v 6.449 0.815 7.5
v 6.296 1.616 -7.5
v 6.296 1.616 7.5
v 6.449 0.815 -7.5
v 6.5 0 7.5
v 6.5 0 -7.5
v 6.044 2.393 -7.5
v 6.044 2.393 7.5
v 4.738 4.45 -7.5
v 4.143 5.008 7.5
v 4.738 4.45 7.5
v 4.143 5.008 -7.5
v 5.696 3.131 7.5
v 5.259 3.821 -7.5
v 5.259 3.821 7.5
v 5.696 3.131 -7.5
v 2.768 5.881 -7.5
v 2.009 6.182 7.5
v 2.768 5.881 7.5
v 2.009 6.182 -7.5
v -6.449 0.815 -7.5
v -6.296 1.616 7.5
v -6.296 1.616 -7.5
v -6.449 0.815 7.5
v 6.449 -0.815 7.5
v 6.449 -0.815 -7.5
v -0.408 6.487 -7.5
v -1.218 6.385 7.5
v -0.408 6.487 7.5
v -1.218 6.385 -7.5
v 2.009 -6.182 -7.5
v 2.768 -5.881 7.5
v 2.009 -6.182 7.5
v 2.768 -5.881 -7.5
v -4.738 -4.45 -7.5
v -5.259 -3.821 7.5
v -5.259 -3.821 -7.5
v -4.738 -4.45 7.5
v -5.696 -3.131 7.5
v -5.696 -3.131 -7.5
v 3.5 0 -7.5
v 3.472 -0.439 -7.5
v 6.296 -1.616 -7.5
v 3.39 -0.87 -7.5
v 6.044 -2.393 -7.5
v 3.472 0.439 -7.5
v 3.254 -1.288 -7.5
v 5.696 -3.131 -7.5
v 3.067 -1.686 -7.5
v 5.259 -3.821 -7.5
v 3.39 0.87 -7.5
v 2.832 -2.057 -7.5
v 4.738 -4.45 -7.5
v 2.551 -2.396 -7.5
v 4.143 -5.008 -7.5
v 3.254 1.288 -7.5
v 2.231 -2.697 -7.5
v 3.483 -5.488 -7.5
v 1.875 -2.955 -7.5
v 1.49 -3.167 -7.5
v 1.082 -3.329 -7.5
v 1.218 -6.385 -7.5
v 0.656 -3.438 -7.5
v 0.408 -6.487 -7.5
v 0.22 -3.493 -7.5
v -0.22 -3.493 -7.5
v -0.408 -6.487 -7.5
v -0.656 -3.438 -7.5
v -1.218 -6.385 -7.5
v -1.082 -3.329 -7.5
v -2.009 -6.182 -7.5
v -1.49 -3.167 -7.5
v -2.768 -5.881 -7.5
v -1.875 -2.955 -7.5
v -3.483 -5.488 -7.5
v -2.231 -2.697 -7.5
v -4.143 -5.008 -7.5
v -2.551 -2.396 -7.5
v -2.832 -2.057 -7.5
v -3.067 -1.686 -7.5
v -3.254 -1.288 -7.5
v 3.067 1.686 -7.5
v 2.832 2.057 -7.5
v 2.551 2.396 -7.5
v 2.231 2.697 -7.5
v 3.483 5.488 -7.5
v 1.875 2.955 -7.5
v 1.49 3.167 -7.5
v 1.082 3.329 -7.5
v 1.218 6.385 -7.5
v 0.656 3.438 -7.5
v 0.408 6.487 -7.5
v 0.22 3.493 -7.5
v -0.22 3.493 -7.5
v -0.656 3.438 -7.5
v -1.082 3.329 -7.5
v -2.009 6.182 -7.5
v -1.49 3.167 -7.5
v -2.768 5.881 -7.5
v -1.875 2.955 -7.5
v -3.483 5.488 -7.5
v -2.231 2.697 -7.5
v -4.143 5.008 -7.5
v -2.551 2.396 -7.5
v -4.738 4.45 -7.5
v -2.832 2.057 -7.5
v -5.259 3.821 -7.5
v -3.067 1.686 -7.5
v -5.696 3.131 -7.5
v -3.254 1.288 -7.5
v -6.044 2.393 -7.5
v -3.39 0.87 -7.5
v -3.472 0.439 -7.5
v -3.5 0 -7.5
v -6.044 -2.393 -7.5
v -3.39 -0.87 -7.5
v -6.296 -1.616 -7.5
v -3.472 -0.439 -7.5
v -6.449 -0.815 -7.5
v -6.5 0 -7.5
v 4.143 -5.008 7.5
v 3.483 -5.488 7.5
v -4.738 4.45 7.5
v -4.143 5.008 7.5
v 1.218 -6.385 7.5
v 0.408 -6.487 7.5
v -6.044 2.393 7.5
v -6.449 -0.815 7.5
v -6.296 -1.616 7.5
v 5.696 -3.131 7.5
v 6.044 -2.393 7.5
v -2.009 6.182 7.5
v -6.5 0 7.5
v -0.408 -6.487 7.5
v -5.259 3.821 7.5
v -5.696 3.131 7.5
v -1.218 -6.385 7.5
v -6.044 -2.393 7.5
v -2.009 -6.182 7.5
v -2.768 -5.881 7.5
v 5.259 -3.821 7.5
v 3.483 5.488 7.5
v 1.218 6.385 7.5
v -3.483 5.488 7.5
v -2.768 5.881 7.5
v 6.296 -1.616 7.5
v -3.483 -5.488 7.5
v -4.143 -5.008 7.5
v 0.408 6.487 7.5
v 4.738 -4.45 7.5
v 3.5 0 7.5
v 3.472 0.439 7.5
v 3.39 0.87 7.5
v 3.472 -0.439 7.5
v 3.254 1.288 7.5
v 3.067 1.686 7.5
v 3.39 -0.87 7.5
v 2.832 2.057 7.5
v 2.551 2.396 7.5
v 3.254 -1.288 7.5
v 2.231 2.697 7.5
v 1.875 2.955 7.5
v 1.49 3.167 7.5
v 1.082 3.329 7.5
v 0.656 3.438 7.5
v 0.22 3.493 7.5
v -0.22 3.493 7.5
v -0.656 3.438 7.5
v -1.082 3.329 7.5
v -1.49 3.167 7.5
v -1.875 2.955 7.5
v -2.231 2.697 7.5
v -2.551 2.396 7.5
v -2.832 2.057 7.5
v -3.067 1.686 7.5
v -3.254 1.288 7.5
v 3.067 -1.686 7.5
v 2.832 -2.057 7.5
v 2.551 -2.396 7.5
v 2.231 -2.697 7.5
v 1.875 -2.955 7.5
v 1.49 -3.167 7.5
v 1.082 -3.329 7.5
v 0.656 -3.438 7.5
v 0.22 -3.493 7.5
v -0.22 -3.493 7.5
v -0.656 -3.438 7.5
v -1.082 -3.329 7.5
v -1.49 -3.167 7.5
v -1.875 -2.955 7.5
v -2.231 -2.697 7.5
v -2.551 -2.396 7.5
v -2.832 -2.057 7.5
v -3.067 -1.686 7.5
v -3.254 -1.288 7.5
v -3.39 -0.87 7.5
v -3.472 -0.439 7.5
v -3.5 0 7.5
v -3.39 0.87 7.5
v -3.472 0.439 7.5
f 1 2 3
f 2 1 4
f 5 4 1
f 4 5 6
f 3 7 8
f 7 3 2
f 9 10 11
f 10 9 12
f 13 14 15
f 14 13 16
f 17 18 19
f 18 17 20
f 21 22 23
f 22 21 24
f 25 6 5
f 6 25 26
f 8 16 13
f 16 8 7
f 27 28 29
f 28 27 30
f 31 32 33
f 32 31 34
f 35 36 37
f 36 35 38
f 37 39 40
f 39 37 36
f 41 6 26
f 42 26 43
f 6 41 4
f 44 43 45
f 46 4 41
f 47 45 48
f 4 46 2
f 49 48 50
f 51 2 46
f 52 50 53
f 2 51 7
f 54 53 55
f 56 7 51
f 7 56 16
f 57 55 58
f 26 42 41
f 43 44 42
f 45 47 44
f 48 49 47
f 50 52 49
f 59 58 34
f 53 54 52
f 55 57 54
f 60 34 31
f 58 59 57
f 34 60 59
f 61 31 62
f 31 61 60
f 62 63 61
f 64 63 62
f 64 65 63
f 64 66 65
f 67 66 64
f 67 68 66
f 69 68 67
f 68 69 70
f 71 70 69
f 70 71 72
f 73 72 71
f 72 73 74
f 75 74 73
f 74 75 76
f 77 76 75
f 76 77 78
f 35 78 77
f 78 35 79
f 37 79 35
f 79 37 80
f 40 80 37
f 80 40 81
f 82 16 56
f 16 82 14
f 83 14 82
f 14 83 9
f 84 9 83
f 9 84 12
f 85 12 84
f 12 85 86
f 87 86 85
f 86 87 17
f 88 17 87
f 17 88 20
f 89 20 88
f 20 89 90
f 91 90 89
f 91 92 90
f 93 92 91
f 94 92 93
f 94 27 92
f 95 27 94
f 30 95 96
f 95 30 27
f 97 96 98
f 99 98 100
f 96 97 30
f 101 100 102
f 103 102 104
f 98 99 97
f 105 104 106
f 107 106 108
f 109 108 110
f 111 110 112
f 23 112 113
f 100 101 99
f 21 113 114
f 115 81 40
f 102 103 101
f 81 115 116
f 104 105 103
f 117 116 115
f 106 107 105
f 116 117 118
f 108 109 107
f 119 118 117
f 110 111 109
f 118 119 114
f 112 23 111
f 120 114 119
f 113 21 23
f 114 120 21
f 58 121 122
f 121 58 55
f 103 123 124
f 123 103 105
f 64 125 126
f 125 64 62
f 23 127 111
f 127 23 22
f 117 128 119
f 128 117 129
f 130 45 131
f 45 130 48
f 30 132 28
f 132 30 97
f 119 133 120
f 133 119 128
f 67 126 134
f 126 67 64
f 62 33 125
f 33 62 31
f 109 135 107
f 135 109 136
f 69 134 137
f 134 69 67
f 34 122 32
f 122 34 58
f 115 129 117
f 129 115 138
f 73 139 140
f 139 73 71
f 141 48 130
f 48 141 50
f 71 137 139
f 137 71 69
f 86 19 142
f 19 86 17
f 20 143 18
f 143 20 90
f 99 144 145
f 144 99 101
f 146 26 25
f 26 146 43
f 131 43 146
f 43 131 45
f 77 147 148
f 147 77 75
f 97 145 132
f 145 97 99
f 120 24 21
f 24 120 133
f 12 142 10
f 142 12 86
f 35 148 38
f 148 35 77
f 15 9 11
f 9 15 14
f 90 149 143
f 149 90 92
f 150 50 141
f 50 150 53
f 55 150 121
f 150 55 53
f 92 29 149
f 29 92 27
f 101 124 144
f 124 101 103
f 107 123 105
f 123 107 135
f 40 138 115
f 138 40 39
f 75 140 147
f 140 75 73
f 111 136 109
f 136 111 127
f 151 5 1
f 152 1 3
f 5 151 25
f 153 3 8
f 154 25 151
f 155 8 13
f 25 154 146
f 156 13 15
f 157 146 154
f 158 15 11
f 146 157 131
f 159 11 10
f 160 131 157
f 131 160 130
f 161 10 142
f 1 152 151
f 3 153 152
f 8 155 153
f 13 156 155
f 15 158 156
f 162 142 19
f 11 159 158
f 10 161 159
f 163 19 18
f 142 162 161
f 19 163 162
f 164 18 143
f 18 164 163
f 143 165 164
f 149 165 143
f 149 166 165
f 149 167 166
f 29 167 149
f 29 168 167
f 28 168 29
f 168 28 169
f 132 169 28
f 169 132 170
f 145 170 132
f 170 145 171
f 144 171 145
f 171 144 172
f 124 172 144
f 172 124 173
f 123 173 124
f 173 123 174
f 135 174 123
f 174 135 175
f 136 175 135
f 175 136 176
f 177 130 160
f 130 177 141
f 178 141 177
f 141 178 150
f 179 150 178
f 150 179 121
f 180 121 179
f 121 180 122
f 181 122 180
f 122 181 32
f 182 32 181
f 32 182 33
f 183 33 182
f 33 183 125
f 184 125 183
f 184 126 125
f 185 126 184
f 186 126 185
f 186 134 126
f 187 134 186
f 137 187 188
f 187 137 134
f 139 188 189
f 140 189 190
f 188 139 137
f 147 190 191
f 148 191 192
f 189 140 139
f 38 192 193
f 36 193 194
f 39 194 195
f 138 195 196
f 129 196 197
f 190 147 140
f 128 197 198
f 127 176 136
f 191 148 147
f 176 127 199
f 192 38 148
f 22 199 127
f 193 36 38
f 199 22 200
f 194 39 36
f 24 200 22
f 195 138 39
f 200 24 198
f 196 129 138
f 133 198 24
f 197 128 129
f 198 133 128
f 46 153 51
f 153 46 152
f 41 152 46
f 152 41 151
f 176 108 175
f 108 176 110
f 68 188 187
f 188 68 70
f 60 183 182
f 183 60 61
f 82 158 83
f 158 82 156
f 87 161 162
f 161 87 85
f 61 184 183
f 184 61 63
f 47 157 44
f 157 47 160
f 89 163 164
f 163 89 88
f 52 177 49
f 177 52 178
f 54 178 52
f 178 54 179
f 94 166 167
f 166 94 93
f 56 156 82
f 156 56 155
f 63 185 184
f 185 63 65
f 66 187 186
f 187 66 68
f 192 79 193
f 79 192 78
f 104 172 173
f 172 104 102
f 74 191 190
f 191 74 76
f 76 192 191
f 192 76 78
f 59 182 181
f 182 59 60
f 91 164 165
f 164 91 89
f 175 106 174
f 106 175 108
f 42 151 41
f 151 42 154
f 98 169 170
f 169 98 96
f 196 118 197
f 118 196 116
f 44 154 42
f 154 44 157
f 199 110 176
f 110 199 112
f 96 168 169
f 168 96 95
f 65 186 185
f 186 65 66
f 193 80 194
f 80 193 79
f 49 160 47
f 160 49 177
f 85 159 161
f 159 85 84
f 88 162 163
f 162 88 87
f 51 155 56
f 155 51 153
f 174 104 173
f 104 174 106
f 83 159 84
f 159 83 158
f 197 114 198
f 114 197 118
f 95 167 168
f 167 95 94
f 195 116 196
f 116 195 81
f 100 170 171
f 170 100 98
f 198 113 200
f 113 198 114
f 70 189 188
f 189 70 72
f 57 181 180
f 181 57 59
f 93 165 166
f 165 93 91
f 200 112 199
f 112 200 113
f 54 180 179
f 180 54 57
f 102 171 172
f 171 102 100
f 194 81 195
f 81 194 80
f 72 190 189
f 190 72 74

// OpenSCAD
$fn = 50;


difference() {
	union() {
		translate(v = [0, 0, -7.5000000000]) {
			cylinder(h = 15, r = 6.5000000000);
		}
	}
	union() {
		translate(v = [0, 0, -100.0000000000]) {
			cylinder(h = 200, r = 3.5000000000);
		}
	}
}
